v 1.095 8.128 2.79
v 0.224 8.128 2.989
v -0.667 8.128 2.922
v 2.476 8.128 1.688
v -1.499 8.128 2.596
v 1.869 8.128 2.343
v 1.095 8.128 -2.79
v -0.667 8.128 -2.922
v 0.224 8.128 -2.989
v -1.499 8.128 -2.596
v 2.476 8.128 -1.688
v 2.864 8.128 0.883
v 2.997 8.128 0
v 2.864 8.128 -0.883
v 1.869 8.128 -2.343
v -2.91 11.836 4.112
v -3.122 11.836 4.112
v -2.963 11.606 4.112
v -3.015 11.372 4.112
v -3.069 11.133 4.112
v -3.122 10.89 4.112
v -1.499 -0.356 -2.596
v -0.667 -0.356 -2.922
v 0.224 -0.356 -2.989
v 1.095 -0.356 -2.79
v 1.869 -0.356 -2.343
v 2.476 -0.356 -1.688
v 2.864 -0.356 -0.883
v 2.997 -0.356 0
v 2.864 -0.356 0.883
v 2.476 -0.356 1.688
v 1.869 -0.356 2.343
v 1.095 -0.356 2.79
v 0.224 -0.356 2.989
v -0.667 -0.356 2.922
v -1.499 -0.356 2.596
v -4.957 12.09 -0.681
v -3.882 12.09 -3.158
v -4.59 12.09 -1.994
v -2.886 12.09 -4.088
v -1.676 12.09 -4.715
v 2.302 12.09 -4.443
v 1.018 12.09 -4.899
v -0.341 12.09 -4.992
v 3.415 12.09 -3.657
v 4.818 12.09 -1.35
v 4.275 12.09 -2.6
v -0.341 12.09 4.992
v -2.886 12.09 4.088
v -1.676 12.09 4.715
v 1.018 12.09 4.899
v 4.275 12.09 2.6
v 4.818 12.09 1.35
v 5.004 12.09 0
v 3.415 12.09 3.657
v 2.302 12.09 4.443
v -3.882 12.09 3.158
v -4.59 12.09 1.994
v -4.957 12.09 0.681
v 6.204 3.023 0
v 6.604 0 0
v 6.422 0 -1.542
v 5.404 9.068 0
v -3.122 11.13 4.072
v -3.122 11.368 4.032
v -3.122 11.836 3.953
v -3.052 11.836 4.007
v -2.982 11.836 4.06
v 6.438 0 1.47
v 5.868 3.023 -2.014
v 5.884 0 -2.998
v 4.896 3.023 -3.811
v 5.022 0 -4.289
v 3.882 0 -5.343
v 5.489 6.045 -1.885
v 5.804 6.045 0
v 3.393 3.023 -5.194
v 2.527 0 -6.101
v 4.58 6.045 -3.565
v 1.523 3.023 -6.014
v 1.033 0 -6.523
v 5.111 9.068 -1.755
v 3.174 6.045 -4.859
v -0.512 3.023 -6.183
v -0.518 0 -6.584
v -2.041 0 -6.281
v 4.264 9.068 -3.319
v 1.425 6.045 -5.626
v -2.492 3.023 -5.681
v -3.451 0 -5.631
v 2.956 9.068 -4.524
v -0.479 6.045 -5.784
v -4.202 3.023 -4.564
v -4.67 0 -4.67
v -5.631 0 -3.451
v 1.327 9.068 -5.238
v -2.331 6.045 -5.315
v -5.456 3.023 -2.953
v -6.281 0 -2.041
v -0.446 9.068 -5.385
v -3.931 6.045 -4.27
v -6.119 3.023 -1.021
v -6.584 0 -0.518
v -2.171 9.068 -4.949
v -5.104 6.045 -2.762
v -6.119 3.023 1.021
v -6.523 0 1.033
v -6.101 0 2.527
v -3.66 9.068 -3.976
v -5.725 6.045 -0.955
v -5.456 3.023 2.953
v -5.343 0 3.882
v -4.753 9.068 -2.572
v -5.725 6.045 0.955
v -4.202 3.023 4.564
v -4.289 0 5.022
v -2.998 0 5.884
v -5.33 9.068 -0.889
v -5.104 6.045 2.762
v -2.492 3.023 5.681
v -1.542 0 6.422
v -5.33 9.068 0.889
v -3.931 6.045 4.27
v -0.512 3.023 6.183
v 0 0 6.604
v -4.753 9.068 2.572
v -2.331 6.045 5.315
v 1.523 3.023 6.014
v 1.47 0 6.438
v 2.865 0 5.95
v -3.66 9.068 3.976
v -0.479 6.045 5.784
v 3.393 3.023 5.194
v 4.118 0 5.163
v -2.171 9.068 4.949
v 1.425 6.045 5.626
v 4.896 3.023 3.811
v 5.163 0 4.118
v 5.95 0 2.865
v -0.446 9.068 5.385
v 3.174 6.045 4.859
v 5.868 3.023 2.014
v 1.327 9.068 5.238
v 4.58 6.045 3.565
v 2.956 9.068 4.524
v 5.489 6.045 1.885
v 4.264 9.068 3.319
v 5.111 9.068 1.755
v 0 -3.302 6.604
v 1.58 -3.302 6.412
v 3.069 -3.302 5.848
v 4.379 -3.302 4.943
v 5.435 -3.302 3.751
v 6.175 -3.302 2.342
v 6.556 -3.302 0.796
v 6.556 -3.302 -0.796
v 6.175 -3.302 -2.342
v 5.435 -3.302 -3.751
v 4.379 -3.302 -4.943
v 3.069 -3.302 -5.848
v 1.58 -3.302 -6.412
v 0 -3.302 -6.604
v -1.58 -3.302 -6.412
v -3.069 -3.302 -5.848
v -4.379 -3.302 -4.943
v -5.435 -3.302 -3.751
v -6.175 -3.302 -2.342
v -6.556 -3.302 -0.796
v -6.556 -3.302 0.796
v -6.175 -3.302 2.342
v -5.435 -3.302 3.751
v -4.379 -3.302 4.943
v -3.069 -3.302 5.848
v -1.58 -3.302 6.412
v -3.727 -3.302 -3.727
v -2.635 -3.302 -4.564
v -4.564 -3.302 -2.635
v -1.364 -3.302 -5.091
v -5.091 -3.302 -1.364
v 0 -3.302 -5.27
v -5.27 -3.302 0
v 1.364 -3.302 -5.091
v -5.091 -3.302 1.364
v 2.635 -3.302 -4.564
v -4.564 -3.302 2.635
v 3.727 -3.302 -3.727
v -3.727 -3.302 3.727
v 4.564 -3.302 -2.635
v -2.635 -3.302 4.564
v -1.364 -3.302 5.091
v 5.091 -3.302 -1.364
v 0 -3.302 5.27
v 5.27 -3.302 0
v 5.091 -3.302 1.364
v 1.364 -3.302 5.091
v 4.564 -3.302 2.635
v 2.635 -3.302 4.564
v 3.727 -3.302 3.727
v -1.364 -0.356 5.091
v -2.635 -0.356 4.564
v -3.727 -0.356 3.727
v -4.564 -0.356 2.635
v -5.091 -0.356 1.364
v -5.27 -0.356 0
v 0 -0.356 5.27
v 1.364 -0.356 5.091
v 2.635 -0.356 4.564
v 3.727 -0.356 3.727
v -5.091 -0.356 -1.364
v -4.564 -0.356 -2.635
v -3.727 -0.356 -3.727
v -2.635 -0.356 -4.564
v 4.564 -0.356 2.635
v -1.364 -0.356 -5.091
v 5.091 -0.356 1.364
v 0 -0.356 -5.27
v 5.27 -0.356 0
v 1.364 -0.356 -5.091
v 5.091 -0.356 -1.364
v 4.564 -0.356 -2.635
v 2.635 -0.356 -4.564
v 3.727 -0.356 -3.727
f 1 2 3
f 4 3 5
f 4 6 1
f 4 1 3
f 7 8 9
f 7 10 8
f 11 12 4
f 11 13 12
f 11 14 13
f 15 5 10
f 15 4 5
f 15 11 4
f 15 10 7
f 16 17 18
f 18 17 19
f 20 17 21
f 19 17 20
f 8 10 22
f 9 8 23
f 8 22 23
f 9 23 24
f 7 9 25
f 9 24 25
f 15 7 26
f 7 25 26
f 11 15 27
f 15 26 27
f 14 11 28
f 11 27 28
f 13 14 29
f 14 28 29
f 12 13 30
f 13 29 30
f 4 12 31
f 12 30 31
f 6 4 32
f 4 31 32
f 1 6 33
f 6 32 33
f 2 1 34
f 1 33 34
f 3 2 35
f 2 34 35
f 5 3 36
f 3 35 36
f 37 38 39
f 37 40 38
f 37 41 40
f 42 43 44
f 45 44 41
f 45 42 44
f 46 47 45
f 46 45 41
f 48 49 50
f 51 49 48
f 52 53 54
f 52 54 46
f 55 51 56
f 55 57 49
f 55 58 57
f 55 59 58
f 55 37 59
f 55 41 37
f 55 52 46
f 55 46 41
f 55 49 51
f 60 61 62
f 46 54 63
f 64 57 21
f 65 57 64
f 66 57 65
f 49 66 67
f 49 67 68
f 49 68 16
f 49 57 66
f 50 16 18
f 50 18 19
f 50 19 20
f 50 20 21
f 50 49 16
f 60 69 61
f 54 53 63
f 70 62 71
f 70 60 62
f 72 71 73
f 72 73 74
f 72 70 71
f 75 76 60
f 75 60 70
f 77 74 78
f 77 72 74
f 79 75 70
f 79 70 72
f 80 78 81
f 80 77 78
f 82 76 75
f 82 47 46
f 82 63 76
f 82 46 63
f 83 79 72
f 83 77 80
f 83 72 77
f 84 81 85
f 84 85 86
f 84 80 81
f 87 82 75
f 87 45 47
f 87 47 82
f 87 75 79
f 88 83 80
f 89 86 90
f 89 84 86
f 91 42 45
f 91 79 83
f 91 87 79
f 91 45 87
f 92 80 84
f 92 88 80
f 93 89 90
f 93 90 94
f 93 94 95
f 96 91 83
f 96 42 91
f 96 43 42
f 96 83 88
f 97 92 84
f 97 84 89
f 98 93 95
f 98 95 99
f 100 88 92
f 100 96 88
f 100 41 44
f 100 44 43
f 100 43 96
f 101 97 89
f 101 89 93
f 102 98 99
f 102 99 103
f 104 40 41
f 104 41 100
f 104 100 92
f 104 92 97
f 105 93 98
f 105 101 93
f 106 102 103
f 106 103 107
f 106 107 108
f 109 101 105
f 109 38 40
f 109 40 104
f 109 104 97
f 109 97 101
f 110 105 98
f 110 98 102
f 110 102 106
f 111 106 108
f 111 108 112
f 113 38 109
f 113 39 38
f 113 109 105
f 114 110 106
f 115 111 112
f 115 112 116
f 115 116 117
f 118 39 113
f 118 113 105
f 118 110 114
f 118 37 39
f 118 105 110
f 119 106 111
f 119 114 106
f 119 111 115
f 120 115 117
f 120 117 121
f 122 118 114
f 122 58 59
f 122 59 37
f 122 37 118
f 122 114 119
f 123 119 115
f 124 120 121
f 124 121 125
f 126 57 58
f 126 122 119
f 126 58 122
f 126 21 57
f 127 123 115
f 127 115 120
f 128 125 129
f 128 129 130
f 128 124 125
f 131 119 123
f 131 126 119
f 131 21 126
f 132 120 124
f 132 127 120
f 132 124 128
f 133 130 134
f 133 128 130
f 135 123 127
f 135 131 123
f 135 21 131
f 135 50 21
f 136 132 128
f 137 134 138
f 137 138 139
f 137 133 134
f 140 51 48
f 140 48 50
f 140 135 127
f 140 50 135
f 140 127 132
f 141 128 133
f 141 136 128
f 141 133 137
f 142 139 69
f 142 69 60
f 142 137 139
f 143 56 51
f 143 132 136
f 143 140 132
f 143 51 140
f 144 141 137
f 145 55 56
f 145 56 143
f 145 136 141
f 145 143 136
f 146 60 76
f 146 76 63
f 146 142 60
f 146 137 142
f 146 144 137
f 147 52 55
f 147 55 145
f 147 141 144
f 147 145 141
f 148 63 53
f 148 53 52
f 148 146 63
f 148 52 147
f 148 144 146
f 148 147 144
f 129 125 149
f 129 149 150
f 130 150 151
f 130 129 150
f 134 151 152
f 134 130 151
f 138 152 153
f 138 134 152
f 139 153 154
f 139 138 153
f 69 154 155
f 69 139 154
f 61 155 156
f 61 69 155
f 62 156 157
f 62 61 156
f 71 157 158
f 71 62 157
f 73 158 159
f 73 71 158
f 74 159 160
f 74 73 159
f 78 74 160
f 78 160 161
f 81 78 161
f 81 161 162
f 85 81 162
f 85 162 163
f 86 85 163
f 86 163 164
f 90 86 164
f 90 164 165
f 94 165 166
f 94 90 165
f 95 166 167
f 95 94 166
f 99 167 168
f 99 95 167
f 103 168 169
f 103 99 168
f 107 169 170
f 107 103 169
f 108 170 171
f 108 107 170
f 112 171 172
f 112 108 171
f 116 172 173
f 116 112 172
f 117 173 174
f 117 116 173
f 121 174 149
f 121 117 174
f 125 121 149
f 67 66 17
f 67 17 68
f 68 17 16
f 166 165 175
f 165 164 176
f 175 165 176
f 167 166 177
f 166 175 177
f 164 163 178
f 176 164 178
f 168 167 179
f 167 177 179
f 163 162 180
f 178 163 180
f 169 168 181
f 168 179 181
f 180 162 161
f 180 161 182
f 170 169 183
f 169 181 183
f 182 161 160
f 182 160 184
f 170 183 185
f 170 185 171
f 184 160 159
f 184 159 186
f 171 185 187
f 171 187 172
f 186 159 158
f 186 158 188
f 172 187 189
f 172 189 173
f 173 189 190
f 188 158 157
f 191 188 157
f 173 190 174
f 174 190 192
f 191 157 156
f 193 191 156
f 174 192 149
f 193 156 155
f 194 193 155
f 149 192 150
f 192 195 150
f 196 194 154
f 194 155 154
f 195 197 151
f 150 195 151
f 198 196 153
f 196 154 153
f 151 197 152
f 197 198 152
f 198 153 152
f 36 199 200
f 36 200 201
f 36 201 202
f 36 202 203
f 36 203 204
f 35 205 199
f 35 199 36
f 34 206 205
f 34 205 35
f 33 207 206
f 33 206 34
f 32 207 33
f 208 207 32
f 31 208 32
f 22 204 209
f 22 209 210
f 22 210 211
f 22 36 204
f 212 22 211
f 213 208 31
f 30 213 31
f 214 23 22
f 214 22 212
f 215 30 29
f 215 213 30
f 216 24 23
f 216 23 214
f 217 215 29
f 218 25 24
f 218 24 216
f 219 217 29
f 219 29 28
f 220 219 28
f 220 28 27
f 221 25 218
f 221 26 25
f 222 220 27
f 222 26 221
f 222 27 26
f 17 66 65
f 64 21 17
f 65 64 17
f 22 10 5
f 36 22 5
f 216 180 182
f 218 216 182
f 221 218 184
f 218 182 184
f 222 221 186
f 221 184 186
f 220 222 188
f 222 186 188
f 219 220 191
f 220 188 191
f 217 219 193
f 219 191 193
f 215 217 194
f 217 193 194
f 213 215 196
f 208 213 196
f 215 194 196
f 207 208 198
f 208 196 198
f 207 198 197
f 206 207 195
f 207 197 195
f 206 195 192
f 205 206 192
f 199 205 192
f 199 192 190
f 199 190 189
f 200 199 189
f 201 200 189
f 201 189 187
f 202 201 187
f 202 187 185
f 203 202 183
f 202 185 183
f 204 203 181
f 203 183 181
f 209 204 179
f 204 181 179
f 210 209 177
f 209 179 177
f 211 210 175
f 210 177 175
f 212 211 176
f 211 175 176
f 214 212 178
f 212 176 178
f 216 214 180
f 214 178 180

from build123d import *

# Parameters (mm, degrees)
SKETCH1_R           = 5.0038
BOSS_EXTRUDE1_DEPTH = 12.0904
SKETCH1_5_R         = 6.604
SKETCH1_6_R         = 6.604
BOSS_EXTRUDE2_DEPTH = 3.302
SKETCH2_R           = 2.9972
CUT_EXTRUDE1_DEPTH  = 11.43
SKETCH3_R           = 5.2705
CUT_EXTRUDE2_DEPTH  = 2.9464
SKETCH4_W           = 1.623389838
SKETCH4_H           = 6.759688833
BOSS_EXTRUDE3_DEPTH = 12.192


with BuildPart() as part:
    # Sketch1 → Boss-Extrude1 (new body)
    with BuildSketch(Plane(origin=(0, 0, 0), x_dir=(1, 0, 0), z_dir=(0, 1, 0))):
        Circle(SKETCH1_R)
    extrude(amount=BOSS_EXTRUDE1_DEPTH)

    # Sketch1<5> → section 0 of loft1
    with BuildSketch(Plane(origin=(0, 0, 0), x_dir=(1, 0, 0), z_dir=(0, 1, 0)), mode=Mode.PRIVATE) as loft1_s0:
        Circle(SKETCH1_5_R)
    # loft up to a face of the part (loft1)
    loft([loft1_s0.sketch, Face(Wire([part.edges().sort_by_distance((-3.425336809, 12.0904, -3.647613218))[0]]))])

    # Sketch1<6> → Boss-Extrude2 (add)
    with BuildSketch(Plane(origin=(0, 0, 0), x_dir=(1, 0, 0), z_dir=(0, 1, 0))):
        Circle(SKETCH1_6_R)
    extrude(amount=-BOSS_EXTRUDE2_DEPTH)

    # Sketch2 → Cut-Extrude1 (cut)
    with BuildSketch(Plane.XZ.offset(3.302)):
        Circle(SKETCH2_R)
    extrude(amount=-CUT_EXTRUDE1_DEPTH, mode=Mode.SUBTRACT)

    # Sketch3 → Cut-Extrude2 (cut)
    with BuildSketch(Plane.XZ.offset(3.302)):
        Circle(SKETCH3_R)
    extrude(amount=-CUT_EXTRUDE2_DEPTH, mode=Mode.SUBTRACT)

    # Sketch4 → Boss-Extrude3 (add)
    with BuildSketch(Plane.XZ.offset(0.3556)):
        with Locations((-2.310294919, 0.731856075)):
            Rectangle(SKETCH4_W, SKETCH4_H)
    extrude(amount=-BOSS_EXTRUDE3_DEPTH)


solid = part.part
